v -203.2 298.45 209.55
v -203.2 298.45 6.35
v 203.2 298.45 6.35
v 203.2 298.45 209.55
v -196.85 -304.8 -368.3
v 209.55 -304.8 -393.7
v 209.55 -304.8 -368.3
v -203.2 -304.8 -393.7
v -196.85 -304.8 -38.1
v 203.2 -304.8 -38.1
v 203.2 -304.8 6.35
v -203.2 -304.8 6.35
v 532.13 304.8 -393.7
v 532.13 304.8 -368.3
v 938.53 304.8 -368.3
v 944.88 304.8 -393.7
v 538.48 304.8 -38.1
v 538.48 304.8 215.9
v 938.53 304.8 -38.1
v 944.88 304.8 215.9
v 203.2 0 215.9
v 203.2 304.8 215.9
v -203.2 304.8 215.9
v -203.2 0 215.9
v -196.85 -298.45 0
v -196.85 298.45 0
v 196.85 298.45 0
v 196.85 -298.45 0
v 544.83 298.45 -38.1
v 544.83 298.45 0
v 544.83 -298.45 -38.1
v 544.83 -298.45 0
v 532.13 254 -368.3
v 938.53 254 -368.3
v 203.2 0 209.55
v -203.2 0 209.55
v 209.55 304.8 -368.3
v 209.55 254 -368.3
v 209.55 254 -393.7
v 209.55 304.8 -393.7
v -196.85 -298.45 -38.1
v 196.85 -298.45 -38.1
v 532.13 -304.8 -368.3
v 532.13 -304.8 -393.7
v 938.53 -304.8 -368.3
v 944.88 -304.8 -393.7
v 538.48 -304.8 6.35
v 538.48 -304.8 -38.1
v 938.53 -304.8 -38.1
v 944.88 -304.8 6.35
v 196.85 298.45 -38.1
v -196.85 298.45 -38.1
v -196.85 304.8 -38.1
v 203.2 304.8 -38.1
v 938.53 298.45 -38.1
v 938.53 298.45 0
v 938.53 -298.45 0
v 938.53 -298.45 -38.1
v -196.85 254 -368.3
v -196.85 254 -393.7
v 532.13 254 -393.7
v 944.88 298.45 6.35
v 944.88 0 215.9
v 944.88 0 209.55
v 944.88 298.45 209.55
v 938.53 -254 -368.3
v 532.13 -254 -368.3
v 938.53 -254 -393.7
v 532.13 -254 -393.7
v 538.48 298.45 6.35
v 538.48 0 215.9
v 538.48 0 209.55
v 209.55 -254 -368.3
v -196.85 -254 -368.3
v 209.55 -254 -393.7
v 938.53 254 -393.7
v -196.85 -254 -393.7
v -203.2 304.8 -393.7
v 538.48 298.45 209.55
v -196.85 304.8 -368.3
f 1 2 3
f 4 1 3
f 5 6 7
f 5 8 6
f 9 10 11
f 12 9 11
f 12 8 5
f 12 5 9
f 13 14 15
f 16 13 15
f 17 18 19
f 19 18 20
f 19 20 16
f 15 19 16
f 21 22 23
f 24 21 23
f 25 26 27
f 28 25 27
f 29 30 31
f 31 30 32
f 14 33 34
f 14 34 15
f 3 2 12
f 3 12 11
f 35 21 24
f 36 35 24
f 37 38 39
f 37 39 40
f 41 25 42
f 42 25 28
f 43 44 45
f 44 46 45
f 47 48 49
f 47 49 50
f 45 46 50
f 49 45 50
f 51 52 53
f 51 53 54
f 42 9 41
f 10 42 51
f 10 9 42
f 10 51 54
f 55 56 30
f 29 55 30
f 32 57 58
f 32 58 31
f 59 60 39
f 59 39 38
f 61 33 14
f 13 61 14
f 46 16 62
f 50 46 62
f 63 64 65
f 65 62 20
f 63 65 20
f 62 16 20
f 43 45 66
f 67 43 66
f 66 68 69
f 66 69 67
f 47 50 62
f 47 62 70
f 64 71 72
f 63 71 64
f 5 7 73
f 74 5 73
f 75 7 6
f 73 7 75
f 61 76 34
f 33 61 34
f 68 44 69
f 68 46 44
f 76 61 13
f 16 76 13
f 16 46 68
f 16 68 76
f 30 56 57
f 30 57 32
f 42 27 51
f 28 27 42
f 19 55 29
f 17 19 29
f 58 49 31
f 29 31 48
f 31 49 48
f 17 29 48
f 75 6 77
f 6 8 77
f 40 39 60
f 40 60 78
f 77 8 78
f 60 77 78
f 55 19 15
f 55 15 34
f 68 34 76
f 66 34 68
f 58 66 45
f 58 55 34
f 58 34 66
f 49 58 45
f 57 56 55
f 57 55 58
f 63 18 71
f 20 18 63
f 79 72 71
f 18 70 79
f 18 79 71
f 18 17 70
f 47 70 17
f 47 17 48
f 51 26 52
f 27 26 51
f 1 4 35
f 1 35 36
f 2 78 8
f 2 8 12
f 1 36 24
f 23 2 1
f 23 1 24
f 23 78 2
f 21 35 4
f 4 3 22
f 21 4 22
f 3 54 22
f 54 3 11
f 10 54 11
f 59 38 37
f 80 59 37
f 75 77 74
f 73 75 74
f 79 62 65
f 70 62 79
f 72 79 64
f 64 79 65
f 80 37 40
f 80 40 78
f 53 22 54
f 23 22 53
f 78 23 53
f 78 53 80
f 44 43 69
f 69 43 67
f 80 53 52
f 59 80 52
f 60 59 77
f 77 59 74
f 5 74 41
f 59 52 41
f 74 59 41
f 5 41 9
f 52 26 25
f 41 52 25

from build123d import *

# Parameters (mm, degrees)
F0_W      = 406.4
F0_H      = 609.6
F1_DEPTH  = 6.35
F2_W      = 406.4
F2_H      = 609.6
F2_W_2    = 393.7
F2_H_2    = 596.9
F3_DEPTH  = 38.1
F4_W      = 6.35
F4_H      = 609.6
F5_DEPTH  = 355.6
F6_W      = 406.4
F6_H      = 6.35
F7_DEPTH  = 203.2
F8_W      = 406.4
F8_H      = 6.35
F9_DEPTH  = 304.8
F10_W     = 50.8
F10_H     = 25.4
F11_DEPTH = 406.4


with BuildPart() as f1:
    # F0 (on Top) → F1 (new body)
    with BuildSketch(Plane.XY):
        Rectangle(F0_W, F0_H)
    extrude(amount=F1_DEPTH)

    # F2 (on face) → F3 (join)
    with BuildSketch(Plane(origin=(0, 0, 0), x_dir=(1, 0, 0), z_dir=(0, 0, -1))):
        Rectangle(F2_W, F2_H)
        Rectangle(F2_W_2, F2_H_2, mode=Mode.SUBTRACT)
    extrude(amount=F3_DEPTH)

    # F4 (on face) → F5 (join)
    with BuildSketch(Plane(origin=(0, 0, -38.1), x_dir=(1, 0, 0), z_dir=(0, 0, -1))):
        with Locations((-200.025, 0)):
            Rectangle(F4_W, F4_H)
    extrude(amount=F5_DEPTH)

    # F6 (on face) → F7 (join)
    with BuildSketch(Plane.XY.offset(6.35)):
        with Locations((0, 301.625)):
            Rectangle(F6_W, F6_H)
    extrude(amount=F7_DEPTH)

    # F8 (on face) → F9 (join)
    with BuildSketch(Plane(origin=(0, 304.8, 0), x_dir=(-1, 0, 0), z_dir=(0, 1, 0))):
        with Locations((0, 212.725)):
            Rectangle(F8_W, F8_H)
    extrude(amount=-F9_DEPTH)

    # F10 (on face) → F11 (join)
    with BuildSketch(Plane.YZ.offset(-196.85)):
        with Locations((-279.4, -381)):
            Rectangle(F10_W, F10_H)
        with Locations((279.4, -381)):
            Rectangle(F10_W, F10_H)
    extrude(amount=F11_DEPTH)


with BuildPart() as f13_1:
    # F13: instance of F1
    add(f1.part.mirror(Plane(origin=(370.84, 22.562766, 3.985638), x_dir=(0, 1, 0), z_dir=(1, 0, 0))))


solid = Compound([f1.part, f13_1.part])
